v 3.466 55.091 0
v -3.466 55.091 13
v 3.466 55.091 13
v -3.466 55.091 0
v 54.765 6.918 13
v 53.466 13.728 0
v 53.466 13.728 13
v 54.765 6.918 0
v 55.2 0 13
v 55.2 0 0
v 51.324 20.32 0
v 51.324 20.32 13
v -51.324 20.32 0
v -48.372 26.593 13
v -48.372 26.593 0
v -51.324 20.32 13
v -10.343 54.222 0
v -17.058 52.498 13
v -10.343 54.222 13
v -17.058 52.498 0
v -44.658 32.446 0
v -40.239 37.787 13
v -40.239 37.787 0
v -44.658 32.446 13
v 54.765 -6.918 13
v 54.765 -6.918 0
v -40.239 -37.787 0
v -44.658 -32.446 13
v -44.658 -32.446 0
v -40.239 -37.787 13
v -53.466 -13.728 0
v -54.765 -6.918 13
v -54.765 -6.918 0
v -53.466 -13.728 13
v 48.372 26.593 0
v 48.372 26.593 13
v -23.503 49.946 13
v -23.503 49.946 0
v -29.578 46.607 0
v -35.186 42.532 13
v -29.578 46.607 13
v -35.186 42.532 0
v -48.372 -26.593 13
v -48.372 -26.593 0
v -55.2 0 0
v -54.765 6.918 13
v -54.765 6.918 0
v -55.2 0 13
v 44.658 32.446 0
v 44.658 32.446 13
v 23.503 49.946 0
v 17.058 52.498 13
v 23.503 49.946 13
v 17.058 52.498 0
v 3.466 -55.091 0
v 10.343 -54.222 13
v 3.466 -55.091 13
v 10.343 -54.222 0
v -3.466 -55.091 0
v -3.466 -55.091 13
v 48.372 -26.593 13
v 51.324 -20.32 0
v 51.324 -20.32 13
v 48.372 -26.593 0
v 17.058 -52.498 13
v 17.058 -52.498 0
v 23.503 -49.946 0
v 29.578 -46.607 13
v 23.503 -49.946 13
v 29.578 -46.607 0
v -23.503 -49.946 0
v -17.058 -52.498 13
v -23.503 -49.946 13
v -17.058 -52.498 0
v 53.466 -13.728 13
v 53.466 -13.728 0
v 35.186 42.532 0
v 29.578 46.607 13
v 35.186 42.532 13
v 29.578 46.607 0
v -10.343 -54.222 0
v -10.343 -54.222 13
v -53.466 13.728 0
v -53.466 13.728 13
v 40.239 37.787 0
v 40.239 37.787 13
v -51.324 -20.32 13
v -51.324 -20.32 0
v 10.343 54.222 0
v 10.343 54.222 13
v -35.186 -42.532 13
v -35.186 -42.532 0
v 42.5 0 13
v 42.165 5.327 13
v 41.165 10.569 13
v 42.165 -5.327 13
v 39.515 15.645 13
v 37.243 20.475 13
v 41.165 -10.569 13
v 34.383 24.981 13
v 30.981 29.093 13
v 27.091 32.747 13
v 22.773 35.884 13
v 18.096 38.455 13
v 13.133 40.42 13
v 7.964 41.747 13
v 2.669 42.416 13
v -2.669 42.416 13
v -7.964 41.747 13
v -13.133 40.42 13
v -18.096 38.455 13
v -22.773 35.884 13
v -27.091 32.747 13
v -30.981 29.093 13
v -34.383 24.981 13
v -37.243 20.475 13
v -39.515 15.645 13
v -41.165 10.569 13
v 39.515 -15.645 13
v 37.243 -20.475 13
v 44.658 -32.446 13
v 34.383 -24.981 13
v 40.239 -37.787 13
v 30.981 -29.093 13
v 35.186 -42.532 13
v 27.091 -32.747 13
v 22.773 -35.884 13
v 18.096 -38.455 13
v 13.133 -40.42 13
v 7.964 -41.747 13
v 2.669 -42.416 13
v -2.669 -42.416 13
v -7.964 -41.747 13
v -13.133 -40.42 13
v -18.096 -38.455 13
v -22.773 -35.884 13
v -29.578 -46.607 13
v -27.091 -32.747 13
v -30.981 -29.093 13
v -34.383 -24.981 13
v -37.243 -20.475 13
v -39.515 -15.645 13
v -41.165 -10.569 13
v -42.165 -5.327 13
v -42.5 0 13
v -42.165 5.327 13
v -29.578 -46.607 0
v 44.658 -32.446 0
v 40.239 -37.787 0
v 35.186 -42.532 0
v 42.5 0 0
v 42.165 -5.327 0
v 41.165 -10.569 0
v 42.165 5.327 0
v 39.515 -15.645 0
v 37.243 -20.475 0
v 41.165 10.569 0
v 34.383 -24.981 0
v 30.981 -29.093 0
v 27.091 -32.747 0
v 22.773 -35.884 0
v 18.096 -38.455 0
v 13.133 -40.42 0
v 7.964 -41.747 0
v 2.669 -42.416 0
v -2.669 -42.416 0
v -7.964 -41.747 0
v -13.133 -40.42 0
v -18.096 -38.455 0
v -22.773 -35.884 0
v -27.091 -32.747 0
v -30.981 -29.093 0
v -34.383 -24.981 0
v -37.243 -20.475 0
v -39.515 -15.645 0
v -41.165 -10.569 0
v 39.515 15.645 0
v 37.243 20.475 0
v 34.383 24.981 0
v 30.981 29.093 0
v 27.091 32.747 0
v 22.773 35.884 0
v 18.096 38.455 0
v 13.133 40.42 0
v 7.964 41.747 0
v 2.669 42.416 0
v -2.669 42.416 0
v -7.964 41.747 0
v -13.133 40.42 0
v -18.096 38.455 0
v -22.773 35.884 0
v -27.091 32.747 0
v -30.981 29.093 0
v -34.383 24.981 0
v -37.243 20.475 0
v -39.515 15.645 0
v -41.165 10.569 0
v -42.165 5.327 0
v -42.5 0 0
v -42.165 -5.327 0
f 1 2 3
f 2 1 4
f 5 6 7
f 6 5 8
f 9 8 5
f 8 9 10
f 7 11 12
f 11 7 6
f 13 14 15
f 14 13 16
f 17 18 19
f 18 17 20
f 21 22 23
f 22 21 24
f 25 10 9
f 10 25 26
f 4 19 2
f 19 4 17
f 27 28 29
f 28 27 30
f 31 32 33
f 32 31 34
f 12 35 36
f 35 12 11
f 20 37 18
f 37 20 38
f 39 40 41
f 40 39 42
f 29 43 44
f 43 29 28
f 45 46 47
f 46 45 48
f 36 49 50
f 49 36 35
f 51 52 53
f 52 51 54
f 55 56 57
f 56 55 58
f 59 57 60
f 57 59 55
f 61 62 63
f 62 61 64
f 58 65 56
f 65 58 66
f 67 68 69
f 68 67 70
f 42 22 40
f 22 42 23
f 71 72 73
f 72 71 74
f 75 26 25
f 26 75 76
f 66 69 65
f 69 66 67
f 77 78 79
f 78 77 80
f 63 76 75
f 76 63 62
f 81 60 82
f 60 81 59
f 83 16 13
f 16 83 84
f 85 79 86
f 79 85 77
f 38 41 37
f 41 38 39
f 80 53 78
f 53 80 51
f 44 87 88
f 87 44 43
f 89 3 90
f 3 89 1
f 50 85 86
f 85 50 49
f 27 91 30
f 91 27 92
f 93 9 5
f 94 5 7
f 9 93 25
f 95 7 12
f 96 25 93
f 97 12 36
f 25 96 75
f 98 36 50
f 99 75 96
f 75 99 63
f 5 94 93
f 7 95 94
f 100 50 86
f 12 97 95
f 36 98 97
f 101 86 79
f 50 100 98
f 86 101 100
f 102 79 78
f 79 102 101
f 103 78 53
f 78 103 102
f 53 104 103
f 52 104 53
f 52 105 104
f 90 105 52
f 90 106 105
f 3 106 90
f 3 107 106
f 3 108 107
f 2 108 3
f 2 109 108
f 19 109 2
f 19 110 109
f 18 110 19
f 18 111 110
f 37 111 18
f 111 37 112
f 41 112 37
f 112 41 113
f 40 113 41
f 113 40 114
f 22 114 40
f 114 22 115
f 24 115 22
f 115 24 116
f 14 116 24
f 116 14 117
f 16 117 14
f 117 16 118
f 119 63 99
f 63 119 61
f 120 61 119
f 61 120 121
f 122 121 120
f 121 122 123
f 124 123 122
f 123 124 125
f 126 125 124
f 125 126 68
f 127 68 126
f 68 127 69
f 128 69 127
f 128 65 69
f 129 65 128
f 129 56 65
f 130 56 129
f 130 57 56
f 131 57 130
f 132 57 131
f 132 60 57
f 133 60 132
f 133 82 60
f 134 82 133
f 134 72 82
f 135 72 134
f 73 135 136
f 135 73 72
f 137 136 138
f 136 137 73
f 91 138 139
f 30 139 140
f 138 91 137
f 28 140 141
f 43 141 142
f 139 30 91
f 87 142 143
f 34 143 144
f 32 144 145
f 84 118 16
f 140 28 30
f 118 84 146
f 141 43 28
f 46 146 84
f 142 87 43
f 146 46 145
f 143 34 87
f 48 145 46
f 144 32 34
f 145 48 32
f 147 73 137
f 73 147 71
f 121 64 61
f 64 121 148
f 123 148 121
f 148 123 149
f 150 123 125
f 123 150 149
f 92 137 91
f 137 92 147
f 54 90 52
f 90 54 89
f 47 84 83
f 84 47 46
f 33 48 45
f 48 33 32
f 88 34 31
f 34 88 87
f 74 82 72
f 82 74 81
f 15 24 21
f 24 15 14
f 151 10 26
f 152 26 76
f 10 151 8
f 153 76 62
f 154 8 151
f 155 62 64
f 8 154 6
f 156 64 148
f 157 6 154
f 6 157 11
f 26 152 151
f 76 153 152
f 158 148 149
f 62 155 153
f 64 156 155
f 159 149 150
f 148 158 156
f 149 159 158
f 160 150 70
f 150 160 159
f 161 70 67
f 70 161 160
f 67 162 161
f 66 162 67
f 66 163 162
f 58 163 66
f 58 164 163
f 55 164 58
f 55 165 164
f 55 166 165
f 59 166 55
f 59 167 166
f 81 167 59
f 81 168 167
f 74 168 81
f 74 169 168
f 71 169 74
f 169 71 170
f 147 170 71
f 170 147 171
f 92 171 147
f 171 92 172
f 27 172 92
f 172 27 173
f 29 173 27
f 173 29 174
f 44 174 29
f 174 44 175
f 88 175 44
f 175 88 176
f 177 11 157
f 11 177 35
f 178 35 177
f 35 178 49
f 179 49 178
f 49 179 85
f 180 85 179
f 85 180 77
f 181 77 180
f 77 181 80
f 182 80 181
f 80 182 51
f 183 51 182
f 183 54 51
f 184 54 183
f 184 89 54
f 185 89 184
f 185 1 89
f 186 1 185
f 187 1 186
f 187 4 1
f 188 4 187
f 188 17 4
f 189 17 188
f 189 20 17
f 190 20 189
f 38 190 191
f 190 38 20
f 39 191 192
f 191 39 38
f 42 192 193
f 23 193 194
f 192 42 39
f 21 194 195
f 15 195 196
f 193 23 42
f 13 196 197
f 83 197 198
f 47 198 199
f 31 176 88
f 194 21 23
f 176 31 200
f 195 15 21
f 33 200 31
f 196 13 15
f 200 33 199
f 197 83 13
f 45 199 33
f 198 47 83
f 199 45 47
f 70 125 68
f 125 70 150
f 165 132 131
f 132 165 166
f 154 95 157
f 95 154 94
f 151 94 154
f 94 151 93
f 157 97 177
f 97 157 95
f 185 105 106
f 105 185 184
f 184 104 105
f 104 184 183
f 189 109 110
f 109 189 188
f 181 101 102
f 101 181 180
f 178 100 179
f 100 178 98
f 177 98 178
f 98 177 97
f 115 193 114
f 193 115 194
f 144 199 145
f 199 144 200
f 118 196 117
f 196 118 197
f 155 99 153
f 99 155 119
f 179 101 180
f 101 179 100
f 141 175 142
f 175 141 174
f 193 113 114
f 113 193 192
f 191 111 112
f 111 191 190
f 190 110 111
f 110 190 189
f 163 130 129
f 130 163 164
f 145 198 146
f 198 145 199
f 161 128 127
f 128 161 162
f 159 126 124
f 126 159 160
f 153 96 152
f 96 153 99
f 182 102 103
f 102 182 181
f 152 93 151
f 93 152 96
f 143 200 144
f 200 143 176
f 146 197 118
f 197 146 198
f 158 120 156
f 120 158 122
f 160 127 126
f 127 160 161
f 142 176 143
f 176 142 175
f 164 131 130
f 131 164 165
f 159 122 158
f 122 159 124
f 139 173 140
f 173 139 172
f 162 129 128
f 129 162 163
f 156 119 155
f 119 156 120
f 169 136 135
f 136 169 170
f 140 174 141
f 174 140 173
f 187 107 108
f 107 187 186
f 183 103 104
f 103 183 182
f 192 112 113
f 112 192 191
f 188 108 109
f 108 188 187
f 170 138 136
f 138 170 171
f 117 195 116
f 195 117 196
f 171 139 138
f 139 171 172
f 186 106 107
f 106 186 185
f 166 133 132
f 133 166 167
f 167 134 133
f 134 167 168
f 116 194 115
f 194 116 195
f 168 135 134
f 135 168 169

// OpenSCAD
$fn = 50;


difference() {
	union() {
		cylinder(h = 13, r = 55.2000000000);
	}
	union() {
		cylinder(h = 13, r = 42.5000000000);
	}
}
